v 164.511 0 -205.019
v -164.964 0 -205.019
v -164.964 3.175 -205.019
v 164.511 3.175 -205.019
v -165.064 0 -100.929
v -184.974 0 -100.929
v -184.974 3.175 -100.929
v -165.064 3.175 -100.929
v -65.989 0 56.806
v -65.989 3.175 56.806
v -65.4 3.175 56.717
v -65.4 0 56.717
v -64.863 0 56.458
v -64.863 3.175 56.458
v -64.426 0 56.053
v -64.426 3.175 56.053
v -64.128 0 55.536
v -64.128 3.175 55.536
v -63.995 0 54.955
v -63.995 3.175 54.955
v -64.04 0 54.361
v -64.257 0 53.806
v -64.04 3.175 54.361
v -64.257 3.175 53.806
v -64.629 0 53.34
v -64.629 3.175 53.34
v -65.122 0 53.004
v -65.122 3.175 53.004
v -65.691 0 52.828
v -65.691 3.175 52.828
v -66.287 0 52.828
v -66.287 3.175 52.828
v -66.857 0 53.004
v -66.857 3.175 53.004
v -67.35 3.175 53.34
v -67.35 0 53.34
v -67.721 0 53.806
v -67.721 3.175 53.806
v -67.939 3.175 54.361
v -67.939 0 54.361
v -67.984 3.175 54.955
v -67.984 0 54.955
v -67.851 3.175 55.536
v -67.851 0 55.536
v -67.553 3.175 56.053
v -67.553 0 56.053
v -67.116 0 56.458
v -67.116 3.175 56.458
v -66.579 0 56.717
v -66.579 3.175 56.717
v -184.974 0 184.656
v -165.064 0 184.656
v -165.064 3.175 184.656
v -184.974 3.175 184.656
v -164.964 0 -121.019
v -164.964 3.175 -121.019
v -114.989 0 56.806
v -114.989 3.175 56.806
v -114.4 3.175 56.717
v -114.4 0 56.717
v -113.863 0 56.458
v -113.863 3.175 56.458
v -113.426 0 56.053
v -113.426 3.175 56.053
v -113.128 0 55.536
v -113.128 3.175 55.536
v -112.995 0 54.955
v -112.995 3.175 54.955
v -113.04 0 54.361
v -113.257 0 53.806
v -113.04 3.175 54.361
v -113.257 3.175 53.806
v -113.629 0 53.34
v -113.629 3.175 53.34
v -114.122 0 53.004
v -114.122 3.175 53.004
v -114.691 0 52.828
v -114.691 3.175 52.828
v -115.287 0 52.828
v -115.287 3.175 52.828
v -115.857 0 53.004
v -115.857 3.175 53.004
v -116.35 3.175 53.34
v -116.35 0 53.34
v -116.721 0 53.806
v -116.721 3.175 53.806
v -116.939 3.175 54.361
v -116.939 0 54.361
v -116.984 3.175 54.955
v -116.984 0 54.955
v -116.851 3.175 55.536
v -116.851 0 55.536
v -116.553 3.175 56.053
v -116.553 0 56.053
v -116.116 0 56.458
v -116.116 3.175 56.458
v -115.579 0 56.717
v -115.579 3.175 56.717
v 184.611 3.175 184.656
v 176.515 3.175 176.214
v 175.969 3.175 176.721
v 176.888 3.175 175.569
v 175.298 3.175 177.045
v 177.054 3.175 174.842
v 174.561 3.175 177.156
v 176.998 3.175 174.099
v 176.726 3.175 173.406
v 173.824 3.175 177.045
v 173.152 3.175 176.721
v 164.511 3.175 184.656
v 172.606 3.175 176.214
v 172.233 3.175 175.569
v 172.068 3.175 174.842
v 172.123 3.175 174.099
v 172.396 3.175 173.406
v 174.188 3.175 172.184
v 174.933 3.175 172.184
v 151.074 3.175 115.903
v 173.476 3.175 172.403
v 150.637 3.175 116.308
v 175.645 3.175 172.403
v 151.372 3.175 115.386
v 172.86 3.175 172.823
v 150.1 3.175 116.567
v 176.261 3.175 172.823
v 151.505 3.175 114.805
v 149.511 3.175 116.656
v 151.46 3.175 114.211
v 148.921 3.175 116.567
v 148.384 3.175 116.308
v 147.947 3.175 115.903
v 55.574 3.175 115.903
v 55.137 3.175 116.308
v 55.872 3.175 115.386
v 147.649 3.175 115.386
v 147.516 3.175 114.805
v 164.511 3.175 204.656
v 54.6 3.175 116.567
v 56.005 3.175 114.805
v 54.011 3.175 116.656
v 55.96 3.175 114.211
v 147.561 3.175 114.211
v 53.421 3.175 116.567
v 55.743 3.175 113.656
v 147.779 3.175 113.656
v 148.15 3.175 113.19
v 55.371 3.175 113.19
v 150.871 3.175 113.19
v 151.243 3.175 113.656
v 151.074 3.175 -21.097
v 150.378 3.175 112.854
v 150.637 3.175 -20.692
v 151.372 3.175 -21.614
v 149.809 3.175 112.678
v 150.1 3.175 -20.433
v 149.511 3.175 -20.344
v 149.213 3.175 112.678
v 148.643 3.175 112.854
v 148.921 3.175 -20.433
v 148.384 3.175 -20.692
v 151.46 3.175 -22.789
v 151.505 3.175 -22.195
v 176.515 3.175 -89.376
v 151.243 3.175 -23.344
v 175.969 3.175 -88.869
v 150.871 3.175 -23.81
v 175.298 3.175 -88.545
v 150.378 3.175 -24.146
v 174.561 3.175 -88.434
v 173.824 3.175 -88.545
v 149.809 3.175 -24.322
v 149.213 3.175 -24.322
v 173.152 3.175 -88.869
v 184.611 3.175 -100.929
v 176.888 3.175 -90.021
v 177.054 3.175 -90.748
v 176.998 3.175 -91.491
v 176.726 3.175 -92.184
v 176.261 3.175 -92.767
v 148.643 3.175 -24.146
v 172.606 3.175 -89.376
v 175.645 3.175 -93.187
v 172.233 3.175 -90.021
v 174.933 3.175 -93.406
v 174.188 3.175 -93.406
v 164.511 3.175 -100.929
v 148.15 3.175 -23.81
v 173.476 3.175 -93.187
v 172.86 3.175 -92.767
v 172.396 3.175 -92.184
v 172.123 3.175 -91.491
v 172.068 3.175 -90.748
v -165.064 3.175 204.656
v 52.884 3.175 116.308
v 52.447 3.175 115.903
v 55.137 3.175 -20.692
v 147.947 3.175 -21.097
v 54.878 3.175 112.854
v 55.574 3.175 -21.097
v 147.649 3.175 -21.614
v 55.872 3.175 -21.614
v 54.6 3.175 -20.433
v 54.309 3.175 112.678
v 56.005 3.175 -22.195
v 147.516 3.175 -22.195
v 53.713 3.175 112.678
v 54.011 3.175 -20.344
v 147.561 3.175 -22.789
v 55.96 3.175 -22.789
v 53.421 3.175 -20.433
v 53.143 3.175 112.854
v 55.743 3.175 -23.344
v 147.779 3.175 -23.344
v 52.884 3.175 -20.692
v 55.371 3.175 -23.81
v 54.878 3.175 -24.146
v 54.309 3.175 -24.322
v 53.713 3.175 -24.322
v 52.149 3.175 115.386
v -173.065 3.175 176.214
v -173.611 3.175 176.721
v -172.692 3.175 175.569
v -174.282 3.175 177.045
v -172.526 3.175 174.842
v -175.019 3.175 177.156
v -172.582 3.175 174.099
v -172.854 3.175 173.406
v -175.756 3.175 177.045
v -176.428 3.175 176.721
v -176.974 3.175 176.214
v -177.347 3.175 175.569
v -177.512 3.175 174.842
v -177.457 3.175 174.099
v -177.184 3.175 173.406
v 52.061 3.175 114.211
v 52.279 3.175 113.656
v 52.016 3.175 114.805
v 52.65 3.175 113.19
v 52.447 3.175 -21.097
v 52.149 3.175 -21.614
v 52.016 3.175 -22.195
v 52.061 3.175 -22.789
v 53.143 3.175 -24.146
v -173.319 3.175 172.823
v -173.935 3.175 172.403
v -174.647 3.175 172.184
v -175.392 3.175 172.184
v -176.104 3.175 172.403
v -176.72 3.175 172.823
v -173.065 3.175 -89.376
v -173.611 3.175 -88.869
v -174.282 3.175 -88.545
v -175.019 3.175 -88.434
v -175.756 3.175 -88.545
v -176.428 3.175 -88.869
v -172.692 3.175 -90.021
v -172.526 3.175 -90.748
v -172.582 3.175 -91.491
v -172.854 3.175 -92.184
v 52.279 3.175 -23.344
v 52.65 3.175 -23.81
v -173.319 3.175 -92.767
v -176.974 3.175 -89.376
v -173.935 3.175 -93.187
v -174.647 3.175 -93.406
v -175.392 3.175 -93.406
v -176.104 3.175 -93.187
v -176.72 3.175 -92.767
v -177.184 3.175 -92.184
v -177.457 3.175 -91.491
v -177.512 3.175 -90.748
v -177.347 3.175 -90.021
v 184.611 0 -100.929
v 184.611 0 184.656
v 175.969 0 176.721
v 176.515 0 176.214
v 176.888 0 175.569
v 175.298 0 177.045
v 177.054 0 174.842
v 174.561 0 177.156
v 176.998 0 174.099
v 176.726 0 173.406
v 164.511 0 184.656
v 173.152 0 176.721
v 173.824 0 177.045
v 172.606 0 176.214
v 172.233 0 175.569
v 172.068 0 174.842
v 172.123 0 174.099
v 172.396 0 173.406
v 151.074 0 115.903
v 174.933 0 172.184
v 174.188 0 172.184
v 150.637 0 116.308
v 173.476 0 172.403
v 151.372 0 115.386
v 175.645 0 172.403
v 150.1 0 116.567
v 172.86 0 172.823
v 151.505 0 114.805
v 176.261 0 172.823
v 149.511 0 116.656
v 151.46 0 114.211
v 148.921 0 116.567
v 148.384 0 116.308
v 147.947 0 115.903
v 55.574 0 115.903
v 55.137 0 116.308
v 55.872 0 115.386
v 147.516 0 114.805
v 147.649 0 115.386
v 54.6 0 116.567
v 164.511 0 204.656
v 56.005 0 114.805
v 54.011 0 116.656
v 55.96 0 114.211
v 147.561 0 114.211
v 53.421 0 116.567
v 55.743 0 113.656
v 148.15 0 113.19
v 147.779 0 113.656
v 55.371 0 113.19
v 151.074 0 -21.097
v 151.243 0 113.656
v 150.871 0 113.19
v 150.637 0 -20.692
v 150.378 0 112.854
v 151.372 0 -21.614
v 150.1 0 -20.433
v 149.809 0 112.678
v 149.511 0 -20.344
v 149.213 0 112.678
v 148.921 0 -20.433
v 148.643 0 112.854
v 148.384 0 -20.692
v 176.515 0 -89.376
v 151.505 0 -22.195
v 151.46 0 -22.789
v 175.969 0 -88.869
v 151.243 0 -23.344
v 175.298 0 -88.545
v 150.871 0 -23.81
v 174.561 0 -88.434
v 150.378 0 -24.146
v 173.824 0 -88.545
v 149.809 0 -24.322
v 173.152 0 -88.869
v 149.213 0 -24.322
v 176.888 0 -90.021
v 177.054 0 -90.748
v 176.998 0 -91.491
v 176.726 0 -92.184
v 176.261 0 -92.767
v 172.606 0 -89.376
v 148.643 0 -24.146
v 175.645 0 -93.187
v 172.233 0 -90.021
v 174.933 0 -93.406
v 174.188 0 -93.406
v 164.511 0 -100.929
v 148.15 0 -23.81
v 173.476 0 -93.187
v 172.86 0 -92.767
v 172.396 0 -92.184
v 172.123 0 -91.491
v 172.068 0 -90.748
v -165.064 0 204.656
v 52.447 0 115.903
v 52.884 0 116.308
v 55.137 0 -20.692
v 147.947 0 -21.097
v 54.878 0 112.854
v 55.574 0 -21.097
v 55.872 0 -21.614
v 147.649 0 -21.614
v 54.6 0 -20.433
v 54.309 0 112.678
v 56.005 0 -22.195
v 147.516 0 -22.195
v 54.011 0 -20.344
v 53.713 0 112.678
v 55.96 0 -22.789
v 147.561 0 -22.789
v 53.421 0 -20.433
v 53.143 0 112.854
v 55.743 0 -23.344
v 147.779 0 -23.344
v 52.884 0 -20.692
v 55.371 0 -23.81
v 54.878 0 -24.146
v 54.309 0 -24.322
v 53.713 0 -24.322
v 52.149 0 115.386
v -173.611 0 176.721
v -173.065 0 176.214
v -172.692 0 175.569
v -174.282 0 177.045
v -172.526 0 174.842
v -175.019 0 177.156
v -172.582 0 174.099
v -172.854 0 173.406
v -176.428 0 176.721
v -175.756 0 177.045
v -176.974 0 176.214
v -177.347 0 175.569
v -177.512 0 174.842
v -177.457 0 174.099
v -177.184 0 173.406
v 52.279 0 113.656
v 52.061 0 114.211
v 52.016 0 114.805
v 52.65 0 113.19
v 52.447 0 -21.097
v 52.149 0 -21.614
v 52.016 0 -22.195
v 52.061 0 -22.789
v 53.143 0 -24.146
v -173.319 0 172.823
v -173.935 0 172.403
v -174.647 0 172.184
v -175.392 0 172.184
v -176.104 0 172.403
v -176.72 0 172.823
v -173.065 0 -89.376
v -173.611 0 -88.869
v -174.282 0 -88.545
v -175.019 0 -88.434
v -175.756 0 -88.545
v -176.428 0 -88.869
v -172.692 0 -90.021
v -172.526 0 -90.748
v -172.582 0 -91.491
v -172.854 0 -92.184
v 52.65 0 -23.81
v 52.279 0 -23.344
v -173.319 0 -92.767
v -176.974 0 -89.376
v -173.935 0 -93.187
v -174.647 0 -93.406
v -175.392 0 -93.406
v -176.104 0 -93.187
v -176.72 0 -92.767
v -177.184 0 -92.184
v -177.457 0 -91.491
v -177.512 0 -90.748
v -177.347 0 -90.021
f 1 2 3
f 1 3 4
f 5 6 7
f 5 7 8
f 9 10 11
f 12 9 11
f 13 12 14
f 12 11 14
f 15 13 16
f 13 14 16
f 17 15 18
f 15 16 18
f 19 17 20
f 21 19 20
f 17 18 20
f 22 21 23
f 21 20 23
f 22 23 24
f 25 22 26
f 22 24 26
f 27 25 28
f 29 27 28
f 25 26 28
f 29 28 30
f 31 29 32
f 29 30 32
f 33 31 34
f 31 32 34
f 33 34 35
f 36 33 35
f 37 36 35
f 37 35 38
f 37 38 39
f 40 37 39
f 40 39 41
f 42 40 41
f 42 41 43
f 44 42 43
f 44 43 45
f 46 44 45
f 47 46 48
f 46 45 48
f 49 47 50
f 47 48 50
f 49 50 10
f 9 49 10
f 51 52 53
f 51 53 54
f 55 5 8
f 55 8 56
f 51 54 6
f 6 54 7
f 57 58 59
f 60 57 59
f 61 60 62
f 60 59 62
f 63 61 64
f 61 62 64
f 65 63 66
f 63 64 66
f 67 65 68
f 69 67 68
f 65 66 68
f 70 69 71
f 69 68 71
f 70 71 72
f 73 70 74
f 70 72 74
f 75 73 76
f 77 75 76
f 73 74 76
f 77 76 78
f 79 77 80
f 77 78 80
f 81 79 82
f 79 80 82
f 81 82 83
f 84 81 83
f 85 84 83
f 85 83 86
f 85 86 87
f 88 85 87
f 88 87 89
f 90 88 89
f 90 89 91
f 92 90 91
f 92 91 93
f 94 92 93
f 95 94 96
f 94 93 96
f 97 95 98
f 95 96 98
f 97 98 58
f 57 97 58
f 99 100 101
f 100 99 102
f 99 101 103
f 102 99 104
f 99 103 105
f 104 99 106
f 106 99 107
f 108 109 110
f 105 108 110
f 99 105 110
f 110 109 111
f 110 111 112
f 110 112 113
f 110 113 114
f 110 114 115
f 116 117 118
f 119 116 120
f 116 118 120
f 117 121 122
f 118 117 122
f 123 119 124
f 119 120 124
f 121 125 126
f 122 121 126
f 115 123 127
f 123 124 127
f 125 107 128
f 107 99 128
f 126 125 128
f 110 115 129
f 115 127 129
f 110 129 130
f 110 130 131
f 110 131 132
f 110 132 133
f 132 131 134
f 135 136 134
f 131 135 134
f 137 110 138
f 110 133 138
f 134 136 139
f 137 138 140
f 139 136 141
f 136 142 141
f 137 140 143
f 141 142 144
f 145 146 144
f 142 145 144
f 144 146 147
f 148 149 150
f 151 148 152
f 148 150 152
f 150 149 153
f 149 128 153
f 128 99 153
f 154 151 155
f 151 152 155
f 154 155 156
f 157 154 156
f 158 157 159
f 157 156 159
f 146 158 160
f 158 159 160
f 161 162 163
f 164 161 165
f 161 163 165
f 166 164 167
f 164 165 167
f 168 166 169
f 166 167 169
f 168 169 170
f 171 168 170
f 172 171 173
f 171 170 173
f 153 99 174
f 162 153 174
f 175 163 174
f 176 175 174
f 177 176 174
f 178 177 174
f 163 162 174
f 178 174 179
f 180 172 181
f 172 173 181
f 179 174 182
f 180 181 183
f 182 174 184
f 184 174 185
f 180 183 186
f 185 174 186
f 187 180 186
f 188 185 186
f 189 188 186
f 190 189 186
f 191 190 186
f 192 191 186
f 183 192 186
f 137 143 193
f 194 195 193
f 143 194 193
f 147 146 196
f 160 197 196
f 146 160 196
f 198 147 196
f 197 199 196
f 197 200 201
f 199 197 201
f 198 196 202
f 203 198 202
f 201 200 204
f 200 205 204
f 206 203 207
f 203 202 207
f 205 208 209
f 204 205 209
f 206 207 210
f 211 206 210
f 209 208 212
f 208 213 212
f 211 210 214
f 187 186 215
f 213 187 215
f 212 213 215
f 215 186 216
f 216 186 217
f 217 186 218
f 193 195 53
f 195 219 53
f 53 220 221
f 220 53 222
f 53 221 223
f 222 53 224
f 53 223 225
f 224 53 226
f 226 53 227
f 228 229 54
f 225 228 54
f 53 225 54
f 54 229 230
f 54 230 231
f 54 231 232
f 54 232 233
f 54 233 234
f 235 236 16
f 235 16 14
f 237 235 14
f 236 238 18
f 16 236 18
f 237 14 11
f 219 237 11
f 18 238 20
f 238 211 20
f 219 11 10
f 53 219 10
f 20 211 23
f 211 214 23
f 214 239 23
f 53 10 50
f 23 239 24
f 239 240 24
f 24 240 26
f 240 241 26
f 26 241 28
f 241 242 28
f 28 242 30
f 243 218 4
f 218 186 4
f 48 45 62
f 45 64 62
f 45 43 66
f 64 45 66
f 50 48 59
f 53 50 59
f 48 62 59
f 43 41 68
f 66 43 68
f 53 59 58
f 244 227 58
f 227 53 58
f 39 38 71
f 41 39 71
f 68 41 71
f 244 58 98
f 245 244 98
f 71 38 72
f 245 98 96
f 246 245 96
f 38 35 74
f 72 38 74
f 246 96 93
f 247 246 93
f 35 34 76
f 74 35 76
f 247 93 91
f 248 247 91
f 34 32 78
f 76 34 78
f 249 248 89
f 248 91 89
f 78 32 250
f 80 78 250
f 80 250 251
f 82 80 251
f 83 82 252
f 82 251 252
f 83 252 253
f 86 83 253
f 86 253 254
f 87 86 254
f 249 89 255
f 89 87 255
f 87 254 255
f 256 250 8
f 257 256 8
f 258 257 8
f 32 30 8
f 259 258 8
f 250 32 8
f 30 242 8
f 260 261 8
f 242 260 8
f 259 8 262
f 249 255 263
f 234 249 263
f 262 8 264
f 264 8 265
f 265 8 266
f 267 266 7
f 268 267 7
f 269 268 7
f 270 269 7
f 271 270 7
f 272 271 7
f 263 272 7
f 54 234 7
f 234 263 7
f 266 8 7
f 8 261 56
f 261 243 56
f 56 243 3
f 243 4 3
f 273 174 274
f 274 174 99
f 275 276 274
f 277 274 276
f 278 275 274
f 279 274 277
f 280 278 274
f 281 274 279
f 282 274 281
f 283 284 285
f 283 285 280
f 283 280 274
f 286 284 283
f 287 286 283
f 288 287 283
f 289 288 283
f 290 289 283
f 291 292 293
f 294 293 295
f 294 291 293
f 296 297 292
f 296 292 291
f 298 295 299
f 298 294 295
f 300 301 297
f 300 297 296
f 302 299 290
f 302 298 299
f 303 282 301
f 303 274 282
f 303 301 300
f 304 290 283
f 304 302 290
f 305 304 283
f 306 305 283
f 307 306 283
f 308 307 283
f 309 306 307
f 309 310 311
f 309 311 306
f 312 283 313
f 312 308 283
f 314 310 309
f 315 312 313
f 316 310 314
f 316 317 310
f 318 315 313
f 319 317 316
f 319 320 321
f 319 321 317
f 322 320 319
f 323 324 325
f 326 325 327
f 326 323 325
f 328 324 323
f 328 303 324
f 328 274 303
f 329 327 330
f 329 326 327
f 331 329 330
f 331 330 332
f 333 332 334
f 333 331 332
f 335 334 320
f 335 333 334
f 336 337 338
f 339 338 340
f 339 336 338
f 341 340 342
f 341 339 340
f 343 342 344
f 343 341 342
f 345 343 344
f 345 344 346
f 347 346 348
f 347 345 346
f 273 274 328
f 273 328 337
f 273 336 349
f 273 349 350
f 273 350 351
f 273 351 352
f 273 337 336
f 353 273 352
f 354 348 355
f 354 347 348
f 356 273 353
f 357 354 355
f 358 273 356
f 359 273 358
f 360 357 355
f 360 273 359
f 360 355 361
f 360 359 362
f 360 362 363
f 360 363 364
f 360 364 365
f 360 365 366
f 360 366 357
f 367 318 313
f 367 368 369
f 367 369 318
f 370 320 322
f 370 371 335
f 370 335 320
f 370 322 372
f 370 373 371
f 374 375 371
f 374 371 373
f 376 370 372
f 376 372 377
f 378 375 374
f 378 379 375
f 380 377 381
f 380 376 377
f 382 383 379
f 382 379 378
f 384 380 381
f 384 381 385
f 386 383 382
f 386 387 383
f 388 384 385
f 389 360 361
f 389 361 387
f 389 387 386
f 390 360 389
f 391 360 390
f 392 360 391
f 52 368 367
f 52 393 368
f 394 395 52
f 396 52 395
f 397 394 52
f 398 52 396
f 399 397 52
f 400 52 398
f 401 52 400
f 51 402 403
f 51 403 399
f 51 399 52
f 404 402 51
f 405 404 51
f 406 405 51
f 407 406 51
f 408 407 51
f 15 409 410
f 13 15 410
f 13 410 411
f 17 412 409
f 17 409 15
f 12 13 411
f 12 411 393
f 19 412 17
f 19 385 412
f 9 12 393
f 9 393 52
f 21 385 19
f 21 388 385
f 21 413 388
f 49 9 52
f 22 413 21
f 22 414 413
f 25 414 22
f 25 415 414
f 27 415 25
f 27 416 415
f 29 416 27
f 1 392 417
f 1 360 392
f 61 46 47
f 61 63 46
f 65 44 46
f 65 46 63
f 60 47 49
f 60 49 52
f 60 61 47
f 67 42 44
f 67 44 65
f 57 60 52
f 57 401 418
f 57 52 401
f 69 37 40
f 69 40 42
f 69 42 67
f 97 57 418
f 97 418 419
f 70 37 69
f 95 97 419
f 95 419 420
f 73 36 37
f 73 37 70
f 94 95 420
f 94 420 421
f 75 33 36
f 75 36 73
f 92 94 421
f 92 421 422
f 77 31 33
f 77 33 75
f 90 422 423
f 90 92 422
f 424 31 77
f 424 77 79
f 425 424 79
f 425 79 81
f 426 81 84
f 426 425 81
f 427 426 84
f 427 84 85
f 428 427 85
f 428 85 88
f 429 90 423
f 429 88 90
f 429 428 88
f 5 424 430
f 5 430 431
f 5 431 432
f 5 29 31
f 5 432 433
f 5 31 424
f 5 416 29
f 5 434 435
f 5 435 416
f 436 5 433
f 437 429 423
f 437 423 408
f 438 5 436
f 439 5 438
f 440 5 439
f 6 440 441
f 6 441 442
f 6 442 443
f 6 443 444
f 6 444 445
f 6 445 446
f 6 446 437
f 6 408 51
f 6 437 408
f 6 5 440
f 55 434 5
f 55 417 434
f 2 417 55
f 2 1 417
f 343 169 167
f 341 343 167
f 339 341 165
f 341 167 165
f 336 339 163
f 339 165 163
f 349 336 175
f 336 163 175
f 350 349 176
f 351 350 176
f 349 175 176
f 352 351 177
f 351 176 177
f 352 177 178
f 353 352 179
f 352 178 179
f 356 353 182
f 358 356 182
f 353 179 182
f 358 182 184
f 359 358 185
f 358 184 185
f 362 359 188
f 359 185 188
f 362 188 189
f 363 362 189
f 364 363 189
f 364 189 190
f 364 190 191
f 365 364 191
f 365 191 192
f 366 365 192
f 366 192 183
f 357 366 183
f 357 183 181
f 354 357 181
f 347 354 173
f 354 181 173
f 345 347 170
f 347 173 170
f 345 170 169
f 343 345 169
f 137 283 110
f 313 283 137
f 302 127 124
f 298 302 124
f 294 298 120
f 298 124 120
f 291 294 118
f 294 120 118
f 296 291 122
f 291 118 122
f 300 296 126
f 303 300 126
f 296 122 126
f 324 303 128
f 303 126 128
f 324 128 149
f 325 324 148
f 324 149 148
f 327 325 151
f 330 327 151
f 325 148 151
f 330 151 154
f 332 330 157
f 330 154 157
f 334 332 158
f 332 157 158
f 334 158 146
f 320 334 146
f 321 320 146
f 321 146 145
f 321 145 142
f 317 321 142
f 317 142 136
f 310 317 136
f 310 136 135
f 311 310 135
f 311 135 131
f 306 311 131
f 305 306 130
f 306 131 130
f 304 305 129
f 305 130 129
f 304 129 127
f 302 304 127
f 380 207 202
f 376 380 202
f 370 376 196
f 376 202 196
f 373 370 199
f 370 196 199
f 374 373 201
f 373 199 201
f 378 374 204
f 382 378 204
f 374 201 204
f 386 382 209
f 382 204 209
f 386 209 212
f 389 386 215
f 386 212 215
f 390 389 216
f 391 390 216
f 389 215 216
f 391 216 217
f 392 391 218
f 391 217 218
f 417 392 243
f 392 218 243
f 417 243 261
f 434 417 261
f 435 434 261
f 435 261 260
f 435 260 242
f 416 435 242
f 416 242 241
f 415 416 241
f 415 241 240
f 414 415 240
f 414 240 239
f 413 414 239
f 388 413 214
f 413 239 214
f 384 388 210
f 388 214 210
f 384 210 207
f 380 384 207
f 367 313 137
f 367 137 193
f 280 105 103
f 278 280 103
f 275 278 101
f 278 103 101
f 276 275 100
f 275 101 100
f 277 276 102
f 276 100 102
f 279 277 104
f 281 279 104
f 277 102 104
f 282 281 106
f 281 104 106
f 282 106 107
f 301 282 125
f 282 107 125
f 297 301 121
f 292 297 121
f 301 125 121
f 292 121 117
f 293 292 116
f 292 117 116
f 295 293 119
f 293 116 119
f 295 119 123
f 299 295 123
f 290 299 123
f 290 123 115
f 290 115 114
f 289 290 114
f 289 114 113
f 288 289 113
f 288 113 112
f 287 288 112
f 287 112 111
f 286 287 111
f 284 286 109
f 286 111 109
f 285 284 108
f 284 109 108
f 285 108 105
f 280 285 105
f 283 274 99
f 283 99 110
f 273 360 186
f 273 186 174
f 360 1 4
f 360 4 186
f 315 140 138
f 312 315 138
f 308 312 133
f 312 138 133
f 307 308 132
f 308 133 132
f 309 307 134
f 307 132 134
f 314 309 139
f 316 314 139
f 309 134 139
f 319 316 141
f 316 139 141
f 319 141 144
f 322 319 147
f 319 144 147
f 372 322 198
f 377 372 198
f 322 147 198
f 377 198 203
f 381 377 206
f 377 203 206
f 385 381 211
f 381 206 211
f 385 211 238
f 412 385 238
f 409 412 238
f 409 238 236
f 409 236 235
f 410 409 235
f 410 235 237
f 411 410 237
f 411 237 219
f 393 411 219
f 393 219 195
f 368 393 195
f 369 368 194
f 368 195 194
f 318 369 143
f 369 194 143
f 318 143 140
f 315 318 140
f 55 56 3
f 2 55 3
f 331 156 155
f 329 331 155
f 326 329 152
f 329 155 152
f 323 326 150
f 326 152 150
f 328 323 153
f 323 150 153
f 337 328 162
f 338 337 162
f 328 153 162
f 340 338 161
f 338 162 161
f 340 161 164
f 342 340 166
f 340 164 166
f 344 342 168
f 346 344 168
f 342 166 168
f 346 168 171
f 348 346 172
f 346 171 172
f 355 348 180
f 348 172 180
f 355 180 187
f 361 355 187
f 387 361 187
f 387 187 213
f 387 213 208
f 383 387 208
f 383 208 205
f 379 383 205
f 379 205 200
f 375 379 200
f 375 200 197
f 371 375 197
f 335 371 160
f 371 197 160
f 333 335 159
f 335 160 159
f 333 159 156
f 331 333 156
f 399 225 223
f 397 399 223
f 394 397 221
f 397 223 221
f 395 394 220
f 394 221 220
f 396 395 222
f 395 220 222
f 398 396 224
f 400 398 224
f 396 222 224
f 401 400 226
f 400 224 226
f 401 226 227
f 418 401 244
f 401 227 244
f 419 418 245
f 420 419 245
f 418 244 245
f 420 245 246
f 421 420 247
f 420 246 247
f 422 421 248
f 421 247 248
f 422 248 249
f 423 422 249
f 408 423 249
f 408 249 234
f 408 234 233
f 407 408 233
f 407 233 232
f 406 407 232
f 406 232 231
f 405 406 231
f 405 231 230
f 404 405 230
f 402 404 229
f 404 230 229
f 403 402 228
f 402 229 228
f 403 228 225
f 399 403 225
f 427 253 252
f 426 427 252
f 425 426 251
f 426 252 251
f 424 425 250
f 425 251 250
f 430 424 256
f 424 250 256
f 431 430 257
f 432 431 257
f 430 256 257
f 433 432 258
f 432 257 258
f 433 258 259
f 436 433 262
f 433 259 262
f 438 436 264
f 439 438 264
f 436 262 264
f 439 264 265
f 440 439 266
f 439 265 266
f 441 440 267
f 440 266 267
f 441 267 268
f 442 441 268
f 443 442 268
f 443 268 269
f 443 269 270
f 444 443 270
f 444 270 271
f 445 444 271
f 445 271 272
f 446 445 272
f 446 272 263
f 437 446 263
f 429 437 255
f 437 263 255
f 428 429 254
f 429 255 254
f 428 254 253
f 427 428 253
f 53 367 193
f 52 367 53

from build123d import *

# Parameters (mm, degrees)
BOSS_EXTRUDE1_DEPTH = 3.175
SKETCH4_R           = 2
CUT_EXTRUDE2_DEPTH  = 3.175
SKETCH7_W           = 20
SKETCH7_H           = 389.675
CUT_EXTRUDE6_DEPTH  = 3.175
SKETCH8_W           = 20.01
SKETCH8_H           = 84
SKETCH8_W_2         = 20.1
SKETCH8_H_2         = 84.09
CUT_EXTRUDE7_DEPTH  = 3.175
SKETCH9_R           = 2.5
CUT_EXTRUDE8_DEPTH  = 3.175


with BuildPart() as part:
    # Sketch1 → Boss-Extrude1 (new body)
    with BuildSketch(Plane(origin=(0, 0, 0), x_dir=(1, 0, 0), z_dir=(0, 1, 0))):
        Polygon((-165.06435994, -204.65564006), (-165.06435994, -184.65564006), (-204.97435994, -184.65564006), (-204.97435994, 100.92935994), (-165.06435994, 100.92935994), (-164.96435994, 121.01935994), (-204.97435994, 121.01935994), (-204.97435994, 205.01935994), (204.61064006, 205.01935994), (204.61064006, 121.01935994), (164.51064006, 120.92935994), (164.51064006, 100.92935994), (204.61064006, 100.92935994), (202.86064006, -184.65564006), (164.51064006, -184.65564006), (164.51064006, -204.65564006), align=None)
    extrude(amount=BOSS_EXTRUDE1_DEPTH)

    # Sketch4 → Cut-Extrude2 (cut)
    with BuildSketch(Plane(origin=(0, 3.175, 0), x_dir=(1, 0, 0), z_dir=(0, 1, 0))):
        with Locations(Location((-114.989359939, -54.80564006, 0), (0, 0, 270))):
            Circle(SKETCH4_R)
        with Locations(Location((-65.989359939, -54.80564006, 0), (0, 0, 270))):
            Circle(SKETCH4_R)
        with Locations(Location((54.010640061, -114.65564006, 0), (0, 0, 270))):
            Circle(SKETCH4_R)
        with Locations(Location((149.510640061, -114.65564006, 0), (0, 0, 270))):
            Circle(SKETCH4_R)
        with Locations(Location((54.010640061, 22.34435994, 0), (0, 0, 270))):
            Circle(SKETCH4_R)
        with Locations(Location((149.510640061, 22.34435994, 0), (0, 0, 270))):
            Circle(SKETCH4_R)
    extrude(amount=-CUT_EXTRUDE2_DEPTH, mode=Mode.SUBTRACT)

    # Sketch7 → Cut-Extrude6 (cut)
    with BuildSketch(Plane(origin=(0, 3.175, 0), x_dir=(1, 0, 0), z_dir=(0, 1, 0))):
        with Locations((-194.97435994, 10.18185994)):
            Rectangle(SKETCH7_W, SKETCH7_H)
        Polygon((204.61064006, 205.01935994), (184.61064006, 205.01935994), (184.61064006, -184.65564006), (202.86064006, -184.65564006), align=None)
    extrude(amount=-CUT_EXTRUDE6_DEPTH, mode=Mode.SUBTRACT)


with BuildPart() as body_2:
    # of the pieces the cut leaves, the one that is kept (cut_extrude6_keep)
    add(part.part.solids().sort_by_distance((-165.06435994, 0, 204.65564006))[0])

    # Sketch8 → Cut-Extrude7 (cut)
    with BuildSketch(Plane(origin=(0, 3.175, 0), x_dir=(1, 0, 0), z_dir=(0, 1, 0))):
        with Locations((-174.96935994, 163.01935994)):
            Rectangle(SKETCH8_W, SKETCH8_H)
        with Locations((174.56064006, 162.97435994)):
            Rectangle(SKETCH8_W_2, SKETCH8_H_2)
    extrude(amount=-CUT_EXTRUDE7_DEPTH, mode=Mode.SUBTRACT)

    # Sketch9 → Cut-Extrude8 (cut)
    with BuildSketch(Plane(origin=(0, 3.175, 0), x_dir=(1, 0, 0), z_dir=(0, 1, 0))):
        with Locations(Location((-175.01935994, -174.65564006, 0), (0, 0, 270))):
            Circle(SKETCH9_R)
        with Locations(Location((174.56064006, -174.65564006, 0), (0, 0, 270))):
            Circle(SKETCH9_R)
        with Locations(Location((174.56064006, 90.93435994, 0), (0, 0, 270))):
            Circle(SKETCH9_R)
        with Locations(Location((-175.01935994, 90.93435994, 0), (0, 0, 270))):
            Circle(SKETCH9_R)
    extrude(amount=-CUT_EXTRUDE8_DEPTH, mode=Mode.SUBTRACT)


solid = body_2.part
